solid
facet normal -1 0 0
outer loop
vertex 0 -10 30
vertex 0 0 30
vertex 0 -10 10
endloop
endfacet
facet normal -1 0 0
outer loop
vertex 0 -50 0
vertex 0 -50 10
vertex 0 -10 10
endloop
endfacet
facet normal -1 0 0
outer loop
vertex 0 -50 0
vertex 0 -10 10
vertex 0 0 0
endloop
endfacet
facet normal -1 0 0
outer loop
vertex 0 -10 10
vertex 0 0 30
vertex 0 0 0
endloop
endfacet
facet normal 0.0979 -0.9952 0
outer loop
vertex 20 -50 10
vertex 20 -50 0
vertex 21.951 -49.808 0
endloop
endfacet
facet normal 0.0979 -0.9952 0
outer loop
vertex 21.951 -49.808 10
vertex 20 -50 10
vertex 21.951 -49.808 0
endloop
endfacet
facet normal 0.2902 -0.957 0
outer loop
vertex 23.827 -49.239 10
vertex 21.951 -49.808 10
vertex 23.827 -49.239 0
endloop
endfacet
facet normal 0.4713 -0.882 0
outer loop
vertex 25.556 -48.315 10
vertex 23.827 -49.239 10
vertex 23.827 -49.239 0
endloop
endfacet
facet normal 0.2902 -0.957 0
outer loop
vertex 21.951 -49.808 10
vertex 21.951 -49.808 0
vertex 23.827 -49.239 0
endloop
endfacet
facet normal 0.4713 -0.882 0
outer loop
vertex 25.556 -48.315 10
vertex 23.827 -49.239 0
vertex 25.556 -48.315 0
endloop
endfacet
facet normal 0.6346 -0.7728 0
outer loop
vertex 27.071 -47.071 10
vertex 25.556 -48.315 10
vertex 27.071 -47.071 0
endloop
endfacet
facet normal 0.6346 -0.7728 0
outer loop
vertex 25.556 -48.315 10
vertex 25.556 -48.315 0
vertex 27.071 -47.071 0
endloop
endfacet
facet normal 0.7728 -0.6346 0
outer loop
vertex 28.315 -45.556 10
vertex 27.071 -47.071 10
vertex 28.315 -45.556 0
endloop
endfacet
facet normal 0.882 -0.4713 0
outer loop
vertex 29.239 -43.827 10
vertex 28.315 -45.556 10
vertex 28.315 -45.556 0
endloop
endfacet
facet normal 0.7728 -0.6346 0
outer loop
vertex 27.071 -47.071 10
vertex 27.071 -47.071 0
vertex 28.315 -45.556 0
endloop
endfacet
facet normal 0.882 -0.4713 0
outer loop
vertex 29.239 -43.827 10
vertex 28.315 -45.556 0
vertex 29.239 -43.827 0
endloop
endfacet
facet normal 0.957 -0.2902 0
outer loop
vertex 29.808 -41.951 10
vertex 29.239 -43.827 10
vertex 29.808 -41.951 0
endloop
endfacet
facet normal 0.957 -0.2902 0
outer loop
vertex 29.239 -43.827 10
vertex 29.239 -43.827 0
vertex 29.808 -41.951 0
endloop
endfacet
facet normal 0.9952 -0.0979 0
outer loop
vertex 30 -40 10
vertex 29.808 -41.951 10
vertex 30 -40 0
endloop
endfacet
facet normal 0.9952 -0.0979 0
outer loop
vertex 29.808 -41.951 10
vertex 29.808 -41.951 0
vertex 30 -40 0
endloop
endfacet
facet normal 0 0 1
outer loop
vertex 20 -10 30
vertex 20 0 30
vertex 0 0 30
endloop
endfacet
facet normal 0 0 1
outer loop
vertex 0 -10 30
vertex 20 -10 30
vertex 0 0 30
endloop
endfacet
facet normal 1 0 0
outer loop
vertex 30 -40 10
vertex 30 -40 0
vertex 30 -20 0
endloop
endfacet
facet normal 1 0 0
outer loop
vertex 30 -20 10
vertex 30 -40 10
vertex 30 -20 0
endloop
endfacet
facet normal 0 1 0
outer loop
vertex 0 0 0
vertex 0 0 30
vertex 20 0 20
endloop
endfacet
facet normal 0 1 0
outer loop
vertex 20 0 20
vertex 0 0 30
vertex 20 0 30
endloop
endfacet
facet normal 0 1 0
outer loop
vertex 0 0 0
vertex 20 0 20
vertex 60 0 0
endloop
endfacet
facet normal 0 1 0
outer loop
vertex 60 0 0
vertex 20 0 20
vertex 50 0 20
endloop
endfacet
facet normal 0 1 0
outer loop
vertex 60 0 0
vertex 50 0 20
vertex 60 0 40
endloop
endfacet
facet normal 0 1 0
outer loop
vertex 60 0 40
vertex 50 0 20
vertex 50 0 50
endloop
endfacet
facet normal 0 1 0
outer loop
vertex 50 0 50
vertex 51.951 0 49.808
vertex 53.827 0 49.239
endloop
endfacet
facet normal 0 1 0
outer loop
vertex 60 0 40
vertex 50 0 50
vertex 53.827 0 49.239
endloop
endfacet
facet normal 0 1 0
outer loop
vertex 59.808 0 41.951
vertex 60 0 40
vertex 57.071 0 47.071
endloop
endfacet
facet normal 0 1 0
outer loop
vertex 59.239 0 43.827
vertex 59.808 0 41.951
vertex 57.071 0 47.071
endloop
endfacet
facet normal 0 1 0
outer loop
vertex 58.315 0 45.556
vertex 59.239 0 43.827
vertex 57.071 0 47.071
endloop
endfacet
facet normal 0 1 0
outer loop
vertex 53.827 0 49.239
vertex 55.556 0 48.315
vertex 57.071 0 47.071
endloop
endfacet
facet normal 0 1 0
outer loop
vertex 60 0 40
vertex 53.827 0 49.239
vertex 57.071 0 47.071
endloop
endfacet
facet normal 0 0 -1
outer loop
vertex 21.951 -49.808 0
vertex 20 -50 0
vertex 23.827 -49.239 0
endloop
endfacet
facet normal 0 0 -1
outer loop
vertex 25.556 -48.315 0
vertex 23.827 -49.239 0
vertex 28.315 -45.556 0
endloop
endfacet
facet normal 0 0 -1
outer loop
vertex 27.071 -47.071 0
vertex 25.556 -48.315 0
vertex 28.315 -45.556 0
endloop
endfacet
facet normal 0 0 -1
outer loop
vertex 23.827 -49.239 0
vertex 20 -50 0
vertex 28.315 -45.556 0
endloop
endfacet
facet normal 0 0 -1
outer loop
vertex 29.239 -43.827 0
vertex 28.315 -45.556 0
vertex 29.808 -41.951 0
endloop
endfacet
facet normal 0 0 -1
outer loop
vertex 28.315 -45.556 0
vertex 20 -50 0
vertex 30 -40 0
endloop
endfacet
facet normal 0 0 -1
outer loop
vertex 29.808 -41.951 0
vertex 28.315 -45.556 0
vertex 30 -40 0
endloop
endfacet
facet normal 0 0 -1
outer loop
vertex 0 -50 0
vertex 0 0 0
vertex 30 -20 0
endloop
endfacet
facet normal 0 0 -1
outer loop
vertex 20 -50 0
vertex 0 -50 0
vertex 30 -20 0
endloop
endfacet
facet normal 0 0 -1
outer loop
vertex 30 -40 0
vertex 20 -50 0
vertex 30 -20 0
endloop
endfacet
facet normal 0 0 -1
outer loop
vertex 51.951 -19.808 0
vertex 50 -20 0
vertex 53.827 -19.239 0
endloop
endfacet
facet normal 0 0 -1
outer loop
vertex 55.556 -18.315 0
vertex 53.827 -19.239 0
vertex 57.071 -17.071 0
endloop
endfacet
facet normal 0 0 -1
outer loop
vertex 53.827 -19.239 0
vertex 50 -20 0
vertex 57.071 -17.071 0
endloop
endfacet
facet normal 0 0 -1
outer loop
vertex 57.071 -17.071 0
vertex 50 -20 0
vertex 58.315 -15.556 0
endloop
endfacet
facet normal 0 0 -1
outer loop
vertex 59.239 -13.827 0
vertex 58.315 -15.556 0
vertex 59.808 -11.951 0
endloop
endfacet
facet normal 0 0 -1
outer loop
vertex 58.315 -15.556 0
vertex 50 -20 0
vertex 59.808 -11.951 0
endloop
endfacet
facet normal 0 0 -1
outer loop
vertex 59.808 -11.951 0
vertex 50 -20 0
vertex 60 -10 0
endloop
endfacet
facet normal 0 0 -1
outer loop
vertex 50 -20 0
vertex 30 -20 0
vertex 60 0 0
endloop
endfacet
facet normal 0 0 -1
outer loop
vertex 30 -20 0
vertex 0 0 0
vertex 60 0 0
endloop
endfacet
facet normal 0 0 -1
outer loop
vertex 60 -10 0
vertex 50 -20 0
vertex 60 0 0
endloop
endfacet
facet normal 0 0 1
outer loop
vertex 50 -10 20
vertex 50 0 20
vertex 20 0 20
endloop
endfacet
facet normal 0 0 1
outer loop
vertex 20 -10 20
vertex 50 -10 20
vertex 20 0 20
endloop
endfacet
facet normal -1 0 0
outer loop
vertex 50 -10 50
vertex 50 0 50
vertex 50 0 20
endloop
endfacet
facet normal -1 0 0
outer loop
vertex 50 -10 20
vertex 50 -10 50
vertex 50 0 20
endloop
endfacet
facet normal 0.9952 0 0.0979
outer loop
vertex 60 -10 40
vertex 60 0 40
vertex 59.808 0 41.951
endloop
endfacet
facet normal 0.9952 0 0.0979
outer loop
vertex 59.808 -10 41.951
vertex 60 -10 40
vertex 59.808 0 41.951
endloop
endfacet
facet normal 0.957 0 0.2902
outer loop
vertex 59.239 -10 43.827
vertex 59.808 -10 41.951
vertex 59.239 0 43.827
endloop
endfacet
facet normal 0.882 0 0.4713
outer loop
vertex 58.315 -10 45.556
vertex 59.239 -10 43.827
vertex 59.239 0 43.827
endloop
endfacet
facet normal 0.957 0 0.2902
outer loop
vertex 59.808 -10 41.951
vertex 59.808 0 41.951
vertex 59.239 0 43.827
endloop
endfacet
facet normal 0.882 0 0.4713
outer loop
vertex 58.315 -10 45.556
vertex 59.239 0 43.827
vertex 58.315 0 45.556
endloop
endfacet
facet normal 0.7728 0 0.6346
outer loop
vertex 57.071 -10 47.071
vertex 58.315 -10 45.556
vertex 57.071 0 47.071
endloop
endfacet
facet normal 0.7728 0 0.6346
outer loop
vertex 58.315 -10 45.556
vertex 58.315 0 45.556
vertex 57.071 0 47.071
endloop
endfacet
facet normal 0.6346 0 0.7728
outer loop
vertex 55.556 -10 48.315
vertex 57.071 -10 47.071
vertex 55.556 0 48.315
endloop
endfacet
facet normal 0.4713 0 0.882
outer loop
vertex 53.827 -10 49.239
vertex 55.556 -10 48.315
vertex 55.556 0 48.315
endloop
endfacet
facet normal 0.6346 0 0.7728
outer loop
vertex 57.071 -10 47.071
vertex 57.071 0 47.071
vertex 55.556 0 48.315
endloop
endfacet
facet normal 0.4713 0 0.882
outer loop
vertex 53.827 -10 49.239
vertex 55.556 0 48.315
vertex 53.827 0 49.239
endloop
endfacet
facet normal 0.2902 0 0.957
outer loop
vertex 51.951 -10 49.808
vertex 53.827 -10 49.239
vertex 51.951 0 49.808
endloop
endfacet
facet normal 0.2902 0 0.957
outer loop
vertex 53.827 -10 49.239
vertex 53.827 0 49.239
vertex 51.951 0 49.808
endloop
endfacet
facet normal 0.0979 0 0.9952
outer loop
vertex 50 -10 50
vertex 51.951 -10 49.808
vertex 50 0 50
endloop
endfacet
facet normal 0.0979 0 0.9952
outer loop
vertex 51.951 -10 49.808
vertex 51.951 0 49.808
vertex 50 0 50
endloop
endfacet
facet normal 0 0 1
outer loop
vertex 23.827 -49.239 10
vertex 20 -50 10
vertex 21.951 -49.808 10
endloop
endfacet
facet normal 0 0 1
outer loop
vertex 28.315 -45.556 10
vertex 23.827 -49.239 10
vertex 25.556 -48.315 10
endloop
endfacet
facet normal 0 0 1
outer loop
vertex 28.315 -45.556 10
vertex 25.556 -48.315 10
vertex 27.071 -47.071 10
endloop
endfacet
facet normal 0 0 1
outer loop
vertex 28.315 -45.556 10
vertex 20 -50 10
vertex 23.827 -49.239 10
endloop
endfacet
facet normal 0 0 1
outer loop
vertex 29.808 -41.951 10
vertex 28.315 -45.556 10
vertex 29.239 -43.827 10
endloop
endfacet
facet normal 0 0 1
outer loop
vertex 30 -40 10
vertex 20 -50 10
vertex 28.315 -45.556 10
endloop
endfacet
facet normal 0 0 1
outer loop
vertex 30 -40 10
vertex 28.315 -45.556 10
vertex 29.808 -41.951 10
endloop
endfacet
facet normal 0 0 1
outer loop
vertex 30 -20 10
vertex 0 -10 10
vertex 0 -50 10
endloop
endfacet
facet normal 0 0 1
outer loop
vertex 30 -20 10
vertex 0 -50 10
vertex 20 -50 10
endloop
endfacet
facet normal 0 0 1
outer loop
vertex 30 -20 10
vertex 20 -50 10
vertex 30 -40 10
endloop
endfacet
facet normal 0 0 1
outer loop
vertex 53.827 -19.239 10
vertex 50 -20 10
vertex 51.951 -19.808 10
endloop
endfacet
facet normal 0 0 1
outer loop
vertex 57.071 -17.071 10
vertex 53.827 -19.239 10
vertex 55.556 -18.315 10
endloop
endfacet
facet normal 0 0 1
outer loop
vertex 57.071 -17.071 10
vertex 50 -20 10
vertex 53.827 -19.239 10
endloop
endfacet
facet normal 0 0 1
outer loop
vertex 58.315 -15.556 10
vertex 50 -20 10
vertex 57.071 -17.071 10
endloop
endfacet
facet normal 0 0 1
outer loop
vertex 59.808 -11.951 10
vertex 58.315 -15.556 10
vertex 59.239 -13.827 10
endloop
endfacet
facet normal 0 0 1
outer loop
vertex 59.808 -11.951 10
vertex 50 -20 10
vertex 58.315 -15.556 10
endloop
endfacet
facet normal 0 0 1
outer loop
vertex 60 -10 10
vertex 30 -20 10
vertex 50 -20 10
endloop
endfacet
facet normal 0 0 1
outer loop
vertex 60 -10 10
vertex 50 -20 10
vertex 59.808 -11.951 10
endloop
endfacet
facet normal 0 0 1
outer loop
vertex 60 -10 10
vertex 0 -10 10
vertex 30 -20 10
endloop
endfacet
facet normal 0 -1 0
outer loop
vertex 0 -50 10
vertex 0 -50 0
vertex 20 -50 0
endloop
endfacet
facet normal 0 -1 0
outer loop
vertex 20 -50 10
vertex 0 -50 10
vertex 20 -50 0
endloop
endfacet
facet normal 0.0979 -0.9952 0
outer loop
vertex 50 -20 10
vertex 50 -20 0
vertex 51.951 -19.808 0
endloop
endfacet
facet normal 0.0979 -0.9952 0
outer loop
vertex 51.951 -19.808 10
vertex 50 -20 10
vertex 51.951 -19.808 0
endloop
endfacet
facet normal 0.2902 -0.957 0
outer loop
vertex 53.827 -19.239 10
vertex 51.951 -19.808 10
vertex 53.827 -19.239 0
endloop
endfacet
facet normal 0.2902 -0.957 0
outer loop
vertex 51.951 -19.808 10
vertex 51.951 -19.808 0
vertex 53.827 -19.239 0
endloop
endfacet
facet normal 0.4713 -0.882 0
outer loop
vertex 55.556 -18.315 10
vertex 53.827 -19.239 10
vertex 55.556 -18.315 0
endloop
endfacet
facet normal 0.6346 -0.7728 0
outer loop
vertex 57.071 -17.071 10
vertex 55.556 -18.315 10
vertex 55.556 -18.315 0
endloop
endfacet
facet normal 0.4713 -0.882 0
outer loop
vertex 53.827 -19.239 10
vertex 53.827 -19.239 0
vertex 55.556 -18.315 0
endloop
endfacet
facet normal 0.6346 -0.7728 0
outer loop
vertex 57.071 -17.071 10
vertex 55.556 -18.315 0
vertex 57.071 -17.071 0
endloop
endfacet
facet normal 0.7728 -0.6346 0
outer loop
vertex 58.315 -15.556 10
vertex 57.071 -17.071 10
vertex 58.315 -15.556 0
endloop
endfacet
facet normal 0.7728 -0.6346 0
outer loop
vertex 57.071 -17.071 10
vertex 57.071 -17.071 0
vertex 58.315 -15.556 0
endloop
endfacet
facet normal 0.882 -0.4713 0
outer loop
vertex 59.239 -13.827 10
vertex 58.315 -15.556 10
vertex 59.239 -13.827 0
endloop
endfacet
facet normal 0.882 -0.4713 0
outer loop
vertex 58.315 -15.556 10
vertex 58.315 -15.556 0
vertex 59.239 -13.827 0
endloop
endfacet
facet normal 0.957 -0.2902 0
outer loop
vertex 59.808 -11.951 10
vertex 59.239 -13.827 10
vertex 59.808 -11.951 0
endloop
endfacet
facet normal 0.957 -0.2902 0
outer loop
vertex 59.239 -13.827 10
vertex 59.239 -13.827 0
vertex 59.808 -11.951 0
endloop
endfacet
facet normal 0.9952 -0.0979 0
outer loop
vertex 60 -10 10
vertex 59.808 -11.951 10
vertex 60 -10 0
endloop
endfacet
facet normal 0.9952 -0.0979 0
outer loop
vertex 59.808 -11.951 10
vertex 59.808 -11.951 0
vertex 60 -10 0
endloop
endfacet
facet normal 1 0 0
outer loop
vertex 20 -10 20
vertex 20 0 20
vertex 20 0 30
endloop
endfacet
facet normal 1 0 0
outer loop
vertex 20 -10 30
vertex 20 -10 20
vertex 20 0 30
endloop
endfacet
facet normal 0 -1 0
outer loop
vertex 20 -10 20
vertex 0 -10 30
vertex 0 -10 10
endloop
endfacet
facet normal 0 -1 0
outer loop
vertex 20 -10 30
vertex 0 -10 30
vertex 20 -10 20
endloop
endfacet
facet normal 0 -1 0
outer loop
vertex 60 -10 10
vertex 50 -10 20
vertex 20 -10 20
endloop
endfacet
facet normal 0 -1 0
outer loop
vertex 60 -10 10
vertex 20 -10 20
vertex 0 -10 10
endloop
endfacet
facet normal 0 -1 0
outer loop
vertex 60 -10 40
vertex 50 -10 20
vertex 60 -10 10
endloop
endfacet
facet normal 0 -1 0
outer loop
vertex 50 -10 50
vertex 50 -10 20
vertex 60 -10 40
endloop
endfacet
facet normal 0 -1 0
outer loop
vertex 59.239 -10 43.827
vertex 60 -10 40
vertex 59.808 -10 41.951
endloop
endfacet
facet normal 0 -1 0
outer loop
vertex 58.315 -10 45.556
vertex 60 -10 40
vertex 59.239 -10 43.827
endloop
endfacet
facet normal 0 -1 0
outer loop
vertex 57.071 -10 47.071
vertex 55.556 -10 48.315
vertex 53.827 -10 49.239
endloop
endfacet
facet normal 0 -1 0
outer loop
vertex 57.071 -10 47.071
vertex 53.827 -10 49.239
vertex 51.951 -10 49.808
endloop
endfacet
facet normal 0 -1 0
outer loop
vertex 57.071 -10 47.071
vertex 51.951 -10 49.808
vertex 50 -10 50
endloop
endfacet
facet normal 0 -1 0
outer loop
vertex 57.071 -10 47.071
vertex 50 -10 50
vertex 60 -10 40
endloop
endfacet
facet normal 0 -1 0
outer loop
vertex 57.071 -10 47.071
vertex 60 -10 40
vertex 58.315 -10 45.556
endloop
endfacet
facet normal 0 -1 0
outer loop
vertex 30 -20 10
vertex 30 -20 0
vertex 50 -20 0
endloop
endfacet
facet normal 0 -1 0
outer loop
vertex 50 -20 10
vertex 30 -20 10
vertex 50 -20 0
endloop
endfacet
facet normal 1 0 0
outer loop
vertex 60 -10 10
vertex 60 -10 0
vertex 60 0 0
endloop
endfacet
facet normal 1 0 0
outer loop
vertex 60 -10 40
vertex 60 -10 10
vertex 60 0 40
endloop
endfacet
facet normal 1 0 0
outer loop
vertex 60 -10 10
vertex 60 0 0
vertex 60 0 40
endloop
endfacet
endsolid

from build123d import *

# Parameters (mm, degrees)
F1_DEPTH = 10
F3_DEPTH = 10


# Not quite as in the source:
# - a feature names something its author has since deleted; it is built from what else it names


with BuildPart() as f1:
    # F0 (on Top) → F1 (new body)
    with BuildSketch(Plane.XY):
        with BuildLine():
            Line((60, 0), (20, 0))
            Line((20, 0), (0, 0))
            Line((0, 0), (0, -50))
            Line((0, -50), (20, -50))
            ThreePointArc((20, -50), (27.0710678119, -47.0710678119), (30, -40))
            Line((30, -40), (30, -20))
            Line((30, -20), (50, -20))
            ThreePointArc((50, -20), (57.0710678119, -17.0710678119), (60, -10))
            Line((60, -10), (60, 0))
        make_face()
    extrude(amount=F1_DEPTH)

    # F2 (on Front) → F3 (join)
    with BuildSketch(Plane.XZ):
        with BuildLine():
            Line((0, 30), (0, 10))
            Line((0, 10), (60, 10))
            Line((60, 10), (60, 40))
            ThreePointArc((60, 40), (57.0710678119, 47.0710678119), (50, 50))
            Line((50, 50), (50, 20))
            Line((50, 20), (20, 20))
            Line((20, 20), (20, 30))
            Line((20, 30), (0, 30))
        make_face()
    extrude(amount=F3_DEPTH)


solid = f1.part
